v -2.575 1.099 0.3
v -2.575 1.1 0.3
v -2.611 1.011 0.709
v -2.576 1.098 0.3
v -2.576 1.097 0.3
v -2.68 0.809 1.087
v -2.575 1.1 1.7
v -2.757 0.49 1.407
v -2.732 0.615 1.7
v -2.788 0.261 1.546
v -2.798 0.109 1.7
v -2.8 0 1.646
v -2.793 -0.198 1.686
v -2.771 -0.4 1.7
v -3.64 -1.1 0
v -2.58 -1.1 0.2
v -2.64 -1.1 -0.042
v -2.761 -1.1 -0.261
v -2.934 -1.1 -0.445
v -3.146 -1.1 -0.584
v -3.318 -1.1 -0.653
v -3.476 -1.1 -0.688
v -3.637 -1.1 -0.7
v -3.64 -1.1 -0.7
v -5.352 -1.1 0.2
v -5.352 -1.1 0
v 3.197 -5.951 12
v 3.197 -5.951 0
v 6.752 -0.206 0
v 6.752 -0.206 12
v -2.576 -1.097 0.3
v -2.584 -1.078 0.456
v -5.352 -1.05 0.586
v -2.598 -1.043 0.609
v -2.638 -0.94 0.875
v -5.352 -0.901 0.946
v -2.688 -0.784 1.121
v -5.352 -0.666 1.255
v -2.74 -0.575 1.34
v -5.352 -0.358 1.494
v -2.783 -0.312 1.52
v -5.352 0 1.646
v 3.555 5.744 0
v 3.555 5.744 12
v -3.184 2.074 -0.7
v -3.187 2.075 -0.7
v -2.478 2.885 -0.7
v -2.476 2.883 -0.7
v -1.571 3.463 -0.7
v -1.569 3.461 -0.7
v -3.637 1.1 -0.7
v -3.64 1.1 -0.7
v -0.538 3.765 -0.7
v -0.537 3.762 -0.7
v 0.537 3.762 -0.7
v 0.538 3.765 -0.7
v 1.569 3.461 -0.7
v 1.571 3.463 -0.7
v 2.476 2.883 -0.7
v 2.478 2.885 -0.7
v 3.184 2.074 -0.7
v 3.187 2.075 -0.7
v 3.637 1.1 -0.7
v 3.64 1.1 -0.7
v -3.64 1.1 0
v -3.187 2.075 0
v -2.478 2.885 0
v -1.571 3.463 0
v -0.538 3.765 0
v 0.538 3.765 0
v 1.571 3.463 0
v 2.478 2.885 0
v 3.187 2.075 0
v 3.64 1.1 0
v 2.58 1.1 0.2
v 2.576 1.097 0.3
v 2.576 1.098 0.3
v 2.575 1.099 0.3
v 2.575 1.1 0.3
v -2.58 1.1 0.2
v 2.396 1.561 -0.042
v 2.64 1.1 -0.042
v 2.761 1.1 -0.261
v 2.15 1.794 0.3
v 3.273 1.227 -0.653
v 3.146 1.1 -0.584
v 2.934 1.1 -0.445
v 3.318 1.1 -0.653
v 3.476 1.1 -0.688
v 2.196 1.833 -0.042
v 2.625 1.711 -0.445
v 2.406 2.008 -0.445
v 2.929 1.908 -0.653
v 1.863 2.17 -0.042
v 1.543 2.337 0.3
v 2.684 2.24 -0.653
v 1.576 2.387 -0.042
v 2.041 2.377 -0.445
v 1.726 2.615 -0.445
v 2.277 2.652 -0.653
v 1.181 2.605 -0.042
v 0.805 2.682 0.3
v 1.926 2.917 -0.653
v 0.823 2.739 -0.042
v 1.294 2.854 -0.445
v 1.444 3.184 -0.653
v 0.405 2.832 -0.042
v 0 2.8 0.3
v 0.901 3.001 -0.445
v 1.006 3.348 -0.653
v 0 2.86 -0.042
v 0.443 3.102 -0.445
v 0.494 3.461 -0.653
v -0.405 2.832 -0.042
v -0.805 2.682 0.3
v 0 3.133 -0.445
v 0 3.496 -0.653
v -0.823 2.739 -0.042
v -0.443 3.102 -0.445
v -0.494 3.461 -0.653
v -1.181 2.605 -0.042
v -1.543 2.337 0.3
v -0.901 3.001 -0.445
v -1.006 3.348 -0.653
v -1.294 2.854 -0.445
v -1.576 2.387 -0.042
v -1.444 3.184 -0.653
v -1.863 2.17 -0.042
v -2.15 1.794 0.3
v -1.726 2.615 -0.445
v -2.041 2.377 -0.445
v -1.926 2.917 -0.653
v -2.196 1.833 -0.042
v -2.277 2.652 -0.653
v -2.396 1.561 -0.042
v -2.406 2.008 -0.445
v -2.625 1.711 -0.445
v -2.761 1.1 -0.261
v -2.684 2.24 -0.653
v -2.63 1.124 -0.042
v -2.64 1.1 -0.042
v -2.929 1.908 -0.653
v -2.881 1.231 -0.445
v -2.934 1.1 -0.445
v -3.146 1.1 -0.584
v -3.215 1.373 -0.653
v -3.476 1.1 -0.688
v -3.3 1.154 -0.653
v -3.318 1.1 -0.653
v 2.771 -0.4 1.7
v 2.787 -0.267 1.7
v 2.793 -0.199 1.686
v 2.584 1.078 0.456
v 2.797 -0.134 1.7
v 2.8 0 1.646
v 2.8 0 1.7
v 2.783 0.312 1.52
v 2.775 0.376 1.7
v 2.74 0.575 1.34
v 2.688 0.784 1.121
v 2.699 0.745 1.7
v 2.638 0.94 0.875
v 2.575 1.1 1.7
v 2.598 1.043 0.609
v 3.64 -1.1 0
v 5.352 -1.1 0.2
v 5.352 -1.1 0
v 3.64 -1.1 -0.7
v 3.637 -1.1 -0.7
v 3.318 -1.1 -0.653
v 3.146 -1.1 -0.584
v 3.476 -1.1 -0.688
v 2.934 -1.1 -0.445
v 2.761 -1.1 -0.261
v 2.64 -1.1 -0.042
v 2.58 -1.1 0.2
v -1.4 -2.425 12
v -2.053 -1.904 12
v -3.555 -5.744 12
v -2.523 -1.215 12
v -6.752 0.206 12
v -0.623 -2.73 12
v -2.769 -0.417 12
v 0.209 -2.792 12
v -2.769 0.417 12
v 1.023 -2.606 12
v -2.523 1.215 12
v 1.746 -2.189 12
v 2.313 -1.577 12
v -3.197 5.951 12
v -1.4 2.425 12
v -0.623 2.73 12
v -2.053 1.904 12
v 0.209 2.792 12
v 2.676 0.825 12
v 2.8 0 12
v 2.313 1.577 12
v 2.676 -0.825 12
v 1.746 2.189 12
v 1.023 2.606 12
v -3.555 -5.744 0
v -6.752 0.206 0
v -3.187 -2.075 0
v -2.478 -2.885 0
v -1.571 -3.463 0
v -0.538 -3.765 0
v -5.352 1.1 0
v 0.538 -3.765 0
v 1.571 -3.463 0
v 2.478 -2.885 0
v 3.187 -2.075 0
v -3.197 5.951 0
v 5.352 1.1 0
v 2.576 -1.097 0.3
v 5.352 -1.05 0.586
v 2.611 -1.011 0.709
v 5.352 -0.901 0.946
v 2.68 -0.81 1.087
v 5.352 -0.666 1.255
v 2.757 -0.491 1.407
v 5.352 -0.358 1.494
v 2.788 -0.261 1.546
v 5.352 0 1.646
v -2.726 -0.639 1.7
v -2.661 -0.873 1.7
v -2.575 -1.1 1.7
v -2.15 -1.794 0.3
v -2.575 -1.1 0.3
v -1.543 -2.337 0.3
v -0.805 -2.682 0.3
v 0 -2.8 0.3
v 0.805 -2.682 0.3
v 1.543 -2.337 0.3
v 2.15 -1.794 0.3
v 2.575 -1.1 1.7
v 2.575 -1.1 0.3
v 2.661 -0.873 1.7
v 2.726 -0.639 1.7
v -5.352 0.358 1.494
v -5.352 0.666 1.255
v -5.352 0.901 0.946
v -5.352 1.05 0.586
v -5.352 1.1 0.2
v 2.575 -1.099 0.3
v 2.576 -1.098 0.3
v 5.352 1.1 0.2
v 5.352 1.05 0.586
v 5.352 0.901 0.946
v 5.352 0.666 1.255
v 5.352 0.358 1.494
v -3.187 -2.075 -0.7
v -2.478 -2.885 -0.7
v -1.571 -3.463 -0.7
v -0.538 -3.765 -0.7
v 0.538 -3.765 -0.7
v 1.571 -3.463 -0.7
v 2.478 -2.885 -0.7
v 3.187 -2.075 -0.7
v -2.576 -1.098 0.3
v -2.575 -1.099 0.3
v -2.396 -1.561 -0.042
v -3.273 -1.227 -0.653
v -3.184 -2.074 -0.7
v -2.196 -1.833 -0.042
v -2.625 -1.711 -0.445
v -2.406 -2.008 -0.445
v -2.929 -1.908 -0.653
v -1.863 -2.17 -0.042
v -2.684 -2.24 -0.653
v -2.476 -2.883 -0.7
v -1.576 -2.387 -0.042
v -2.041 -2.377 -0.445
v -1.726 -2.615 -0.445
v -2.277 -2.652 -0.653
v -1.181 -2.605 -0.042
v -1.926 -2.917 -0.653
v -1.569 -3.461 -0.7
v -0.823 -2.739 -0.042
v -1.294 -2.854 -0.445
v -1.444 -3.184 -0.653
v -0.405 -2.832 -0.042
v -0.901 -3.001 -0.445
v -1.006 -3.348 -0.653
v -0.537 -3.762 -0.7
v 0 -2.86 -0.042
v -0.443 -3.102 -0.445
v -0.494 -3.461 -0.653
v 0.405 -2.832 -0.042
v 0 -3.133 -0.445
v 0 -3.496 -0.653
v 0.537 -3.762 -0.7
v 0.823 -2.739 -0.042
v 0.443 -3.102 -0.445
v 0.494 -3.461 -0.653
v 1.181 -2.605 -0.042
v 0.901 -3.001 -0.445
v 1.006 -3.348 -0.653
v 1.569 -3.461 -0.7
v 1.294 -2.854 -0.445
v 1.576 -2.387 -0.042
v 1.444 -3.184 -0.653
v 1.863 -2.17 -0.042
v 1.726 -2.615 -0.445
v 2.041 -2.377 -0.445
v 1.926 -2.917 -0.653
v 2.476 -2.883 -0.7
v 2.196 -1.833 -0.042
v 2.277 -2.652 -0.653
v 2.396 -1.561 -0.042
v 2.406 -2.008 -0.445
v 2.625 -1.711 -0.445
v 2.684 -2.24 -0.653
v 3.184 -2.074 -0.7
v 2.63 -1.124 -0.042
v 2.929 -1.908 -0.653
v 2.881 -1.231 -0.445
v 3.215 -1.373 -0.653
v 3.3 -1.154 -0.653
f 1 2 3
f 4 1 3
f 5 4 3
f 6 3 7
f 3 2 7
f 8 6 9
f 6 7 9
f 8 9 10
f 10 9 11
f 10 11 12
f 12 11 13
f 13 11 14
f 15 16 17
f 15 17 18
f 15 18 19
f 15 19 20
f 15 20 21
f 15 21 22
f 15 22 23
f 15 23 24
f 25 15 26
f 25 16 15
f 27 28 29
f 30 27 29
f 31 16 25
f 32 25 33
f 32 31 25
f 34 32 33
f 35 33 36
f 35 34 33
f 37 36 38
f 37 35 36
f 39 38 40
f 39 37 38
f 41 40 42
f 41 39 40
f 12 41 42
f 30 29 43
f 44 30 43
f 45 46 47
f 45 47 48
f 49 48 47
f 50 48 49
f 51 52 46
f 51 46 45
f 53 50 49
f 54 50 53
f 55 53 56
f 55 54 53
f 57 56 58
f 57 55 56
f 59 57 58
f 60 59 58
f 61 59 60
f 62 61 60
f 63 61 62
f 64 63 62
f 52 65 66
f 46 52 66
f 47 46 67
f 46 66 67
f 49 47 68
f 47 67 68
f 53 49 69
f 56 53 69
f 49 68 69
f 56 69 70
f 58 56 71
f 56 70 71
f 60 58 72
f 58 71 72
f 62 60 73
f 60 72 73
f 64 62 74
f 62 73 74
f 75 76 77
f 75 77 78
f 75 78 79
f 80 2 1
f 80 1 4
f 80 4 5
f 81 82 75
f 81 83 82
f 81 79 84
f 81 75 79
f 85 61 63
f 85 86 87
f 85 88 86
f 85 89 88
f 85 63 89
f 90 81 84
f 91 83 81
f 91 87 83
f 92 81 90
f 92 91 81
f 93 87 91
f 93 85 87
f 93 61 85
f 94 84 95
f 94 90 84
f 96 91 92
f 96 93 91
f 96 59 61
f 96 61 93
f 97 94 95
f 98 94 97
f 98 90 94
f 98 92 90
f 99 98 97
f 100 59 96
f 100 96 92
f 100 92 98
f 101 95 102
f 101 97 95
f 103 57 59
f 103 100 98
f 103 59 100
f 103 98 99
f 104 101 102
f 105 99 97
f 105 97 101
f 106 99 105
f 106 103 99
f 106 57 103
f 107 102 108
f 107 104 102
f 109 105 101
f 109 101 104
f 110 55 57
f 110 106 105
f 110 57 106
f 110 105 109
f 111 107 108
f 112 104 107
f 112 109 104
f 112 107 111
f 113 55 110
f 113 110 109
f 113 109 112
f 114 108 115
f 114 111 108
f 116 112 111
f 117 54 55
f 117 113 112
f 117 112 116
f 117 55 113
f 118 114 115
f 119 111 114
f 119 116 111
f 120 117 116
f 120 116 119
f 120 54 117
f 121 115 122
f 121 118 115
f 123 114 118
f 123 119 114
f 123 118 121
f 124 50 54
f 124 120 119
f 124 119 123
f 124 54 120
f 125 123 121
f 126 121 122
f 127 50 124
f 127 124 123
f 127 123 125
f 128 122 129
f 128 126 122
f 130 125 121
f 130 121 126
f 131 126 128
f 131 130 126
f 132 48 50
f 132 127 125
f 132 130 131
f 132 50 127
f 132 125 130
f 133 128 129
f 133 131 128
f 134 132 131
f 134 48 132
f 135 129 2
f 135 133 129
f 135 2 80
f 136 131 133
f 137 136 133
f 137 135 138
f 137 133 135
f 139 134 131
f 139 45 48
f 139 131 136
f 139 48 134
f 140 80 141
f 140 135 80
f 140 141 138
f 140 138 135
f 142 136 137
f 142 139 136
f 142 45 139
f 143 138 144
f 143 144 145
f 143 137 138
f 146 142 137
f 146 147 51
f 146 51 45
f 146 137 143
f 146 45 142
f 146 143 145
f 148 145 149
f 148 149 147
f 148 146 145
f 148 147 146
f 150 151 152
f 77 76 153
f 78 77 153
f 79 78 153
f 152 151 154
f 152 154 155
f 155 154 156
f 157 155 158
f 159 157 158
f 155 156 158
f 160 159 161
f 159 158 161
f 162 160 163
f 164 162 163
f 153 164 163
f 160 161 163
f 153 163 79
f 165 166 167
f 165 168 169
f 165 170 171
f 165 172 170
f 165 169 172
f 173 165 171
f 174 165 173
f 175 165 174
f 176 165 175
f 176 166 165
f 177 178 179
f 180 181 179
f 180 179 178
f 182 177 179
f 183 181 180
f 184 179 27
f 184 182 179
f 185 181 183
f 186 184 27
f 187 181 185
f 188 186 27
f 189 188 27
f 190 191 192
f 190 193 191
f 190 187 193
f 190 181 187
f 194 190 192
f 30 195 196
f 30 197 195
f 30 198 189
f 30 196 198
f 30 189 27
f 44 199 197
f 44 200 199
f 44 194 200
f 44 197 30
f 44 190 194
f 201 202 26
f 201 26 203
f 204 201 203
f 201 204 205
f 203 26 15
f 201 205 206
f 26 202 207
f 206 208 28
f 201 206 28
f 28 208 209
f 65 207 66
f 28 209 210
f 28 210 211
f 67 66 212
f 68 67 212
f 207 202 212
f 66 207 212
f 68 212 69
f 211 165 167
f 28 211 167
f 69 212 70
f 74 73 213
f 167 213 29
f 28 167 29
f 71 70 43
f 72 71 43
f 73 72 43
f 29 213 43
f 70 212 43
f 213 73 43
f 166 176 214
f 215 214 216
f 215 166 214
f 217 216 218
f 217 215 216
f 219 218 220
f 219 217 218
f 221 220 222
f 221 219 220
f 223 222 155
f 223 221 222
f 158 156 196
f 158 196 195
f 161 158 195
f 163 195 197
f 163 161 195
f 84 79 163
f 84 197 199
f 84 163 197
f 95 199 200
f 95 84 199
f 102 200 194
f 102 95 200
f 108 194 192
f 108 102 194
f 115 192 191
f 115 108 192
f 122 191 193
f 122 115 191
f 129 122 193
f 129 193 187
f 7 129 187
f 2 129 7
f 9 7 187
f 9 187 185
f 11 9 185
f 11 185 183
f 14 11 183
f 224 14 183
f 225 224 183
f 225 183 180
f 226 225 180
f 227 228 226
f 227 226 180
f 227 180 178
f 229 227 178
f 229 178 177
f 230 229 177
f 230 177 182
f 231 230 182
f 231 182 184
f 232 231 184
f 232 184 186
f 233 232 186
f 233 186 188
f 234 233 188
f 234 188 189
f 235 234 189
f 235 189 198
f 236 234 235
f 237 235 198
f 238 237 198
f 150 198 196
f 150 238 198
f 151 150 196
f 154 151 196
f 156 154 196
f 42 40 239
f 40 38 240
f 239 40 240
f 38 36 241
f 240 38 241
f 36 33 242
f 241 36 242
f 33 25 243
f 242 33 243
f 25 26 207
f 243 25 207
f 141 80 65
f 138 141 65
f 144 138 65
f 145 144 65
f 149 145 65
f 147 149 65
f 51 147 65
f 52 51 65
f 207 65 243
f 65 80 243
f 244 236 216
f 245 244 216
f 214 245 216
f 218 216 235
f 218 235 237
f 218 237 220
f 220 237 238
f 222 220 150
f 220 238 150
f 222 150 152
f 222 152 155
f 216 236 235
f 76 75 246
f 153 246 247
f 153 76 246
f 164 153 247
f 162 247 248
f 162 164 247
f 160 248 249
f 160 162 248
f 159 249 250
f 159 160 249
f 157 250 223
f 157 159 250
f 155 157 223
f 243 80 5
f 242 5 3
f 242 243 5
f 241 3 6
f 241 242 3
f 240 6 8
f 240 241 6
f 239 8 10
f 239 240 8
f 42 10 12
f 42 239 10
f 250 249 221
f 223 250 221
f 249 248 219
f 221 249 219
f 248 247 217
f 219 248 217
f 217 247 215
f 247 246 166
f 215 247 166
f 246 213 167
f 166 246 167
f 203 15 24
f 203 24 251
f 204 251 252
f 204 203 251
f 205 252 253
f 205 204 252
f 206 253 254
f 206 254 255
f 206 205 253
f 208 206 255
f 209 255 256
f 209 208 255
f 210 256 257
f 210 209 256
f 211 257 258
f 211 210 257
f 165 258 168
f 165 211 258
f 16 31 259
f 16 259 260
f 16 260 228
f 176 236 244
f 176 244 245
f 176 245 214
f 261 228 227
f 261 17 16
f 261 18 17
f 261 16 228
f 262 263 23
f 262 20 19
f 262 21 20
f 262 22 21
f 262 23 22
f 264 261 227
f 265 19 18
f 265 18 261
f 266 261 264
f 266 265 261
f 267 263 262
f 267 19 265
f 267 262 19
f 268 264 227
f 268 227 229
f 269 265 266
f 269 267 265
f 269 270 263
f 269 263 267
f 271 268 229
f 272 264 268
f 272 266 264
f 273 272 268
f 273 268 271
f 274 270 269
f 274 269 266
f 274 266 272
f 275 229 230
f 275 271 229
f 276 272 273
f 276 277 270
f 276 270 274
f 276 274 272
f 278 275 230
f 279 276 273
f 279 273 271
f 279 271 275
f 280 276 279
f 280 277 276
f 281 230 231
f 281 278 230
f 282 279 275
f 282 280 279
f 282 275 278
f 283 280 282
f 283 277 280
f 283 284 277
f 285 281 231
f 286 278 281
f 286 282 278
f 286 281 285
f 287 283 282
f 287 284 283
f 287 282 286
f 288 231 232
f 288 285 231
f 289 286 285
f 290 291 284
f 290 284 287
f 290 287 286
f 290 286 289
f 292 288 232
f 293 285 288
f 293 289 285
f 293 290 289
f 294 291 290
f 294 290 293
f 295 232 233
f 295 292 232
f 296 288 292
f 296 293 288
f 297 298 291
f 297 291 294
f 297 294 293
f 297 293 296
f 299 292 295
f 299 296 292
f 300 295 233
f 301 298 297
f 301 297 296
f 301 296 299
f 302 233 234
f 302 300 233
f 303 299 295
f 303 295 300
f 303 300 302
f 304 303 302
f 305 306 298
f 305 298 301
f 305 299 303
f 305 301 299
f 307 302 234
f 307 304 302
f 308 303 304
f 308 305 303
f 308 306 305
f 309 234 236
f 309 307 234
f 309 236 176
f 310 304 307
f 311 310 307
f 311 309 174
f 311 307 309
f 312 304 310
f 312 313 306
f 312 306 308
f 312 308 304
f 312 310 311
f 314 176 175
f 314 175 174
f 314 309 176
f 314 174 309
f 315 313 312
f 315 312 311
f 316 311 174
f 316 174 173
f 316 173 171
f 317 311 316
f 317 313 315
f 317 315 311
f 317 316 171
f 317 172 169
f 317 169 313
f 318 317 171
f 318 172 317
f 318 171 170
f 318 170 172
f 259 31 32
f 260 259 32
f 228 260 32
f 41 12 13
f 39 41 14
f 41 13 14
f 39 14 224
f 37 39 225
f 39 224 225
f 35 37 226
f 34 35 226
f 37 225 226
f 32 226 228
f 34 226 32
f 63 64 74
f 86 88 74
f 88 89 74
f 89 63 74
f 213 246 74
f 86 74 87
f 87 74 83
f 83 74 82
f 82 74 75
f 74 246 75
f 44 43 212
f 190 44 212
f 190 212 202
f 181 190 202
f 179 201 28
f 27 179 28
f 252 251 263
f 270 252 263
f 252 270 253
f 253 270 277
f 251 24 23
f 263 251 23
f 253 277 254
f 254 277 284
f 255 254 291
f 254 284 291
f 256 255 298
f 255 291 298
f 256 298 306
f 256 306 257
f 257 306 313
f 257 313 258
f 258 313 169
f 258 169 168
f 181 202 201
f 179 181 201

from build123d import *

# Parameters (mm, degrees)
F0_R         = 3.5
F0_R_2       = 2.8
F1_DEPTH     = 12
F3_DEPTH     = 1.7
F5_DEPTH     = 0.7
F6_T4_DEPTH  = 6.526963201
F6_S5_R      = 2.8
F6_T6_DEPTH  = 5
F6_T10_DEPTH = 6.526963201
F6_S11_R     = 2.8
F6_T12_DEPTH = 5
F6_T16_DEPTH = 6.526963201
F6_S17_R     = 2.8
F6_T18_DEPTH = 5
F6_T22_DEPTH = 6.526963201
F6_S23_R     = 2.8
F6_T24_DEPTH = 5
F7_T2_ANGLE  = 236.1398810925
F7_T4_ANGLE  = 236.1398810925


# Not quite as in the source:
# - a fillet or chamfer that OpenCascade refuses, or shapes differently, is made with other operations: its cross-section is extruded or revolved along the edge and cut away or added
# - a pattern or mirror of a feature is missing from the dataset's text; its kind, count and spacing are read off the source's solid


with BuildPart() as f1:
    # F0 (on Top) → F1 (new body)
    with BuildSketch(Plane.XY):
        Polygon((3.1971086236, -5.9505038819), (6.7518418389, -0.2064746542), (3.5547332152, 5.7440292277), (-3.1971086236, 5.9505038819), (-6.7518418389, 0.2064746542), (-3.5547332152, -5.7440292277), align=None)
        Circle(F0_R, mode=Mode.SUBTRACT)
        Circle(F0_R)
        Circle(F0_R_2, mode=Mode.SUBTRACT)
    extrude(amount=F1_DEPTH)

    # F2 (on face) → F3 (cut)
    with BuildSketch(Plane(origin=(0, 0, 0), x_dir=(1, 0, 0), z_dir=(0, 0, -1))):
        with BuildLine():
            Line((-5.3518418389, -1.1), (-2.5748786379, -1.1))
            ThreePointArc((-2.5748786379, -1.1), (-2.8, 0), (-2.5748786379, 1.1))
            Line((-2.5748786379, 1.1), (-5.3518418389, 1.1))
            Line((-5.3518418389, 1.1), (-5.3518418389, -1.1))
        make_face()
        with BuildLine():
            Line((2.5748786379, -1.1), (5.3518418389, -1.1))
            Line((5.3518418389, -1.1), (5.3518418389, 1.1))
            Line((5.3518418389, 1.1), (2.5748786379, 1.1))
            ThreePointArc((2.5748786379, 1.1), (2.7431423756, 0.5613999527), (2.8, 0))
            ThreePointArc((2.8, 0), (2.7431423756, -0.5613999527), (2.5748786379, -1.1))
        make_face()
    extrude(amount=-F3_DEPTH, mode=Mode.SUBTRACT)

    # F4 (on face) → F5 (join)
    with BuildSketch(Plane(origin=(0, 0, 0), x_dir=(1, 0, 0), z_dir=(0, 0, -1))):
        with BuildLine():
            ThreePointArc((-3.6402666737, -1.1), (0, -3.8028333457), (3.6402666737, -1.1))
            Line((3.6402666737, -1.1), (2.5748786379, -1.1))
            ThreePointArc((2.5748786379, -1.1), (0, -2.8), (-2.5748786379, -1.1))
            Line((-2.5748786379, -1.1), (-3.6402666737, -1.1))
        make_face()
    f5 = extrude(amount=F5_DEPTH)

    # F5_copies: F5 across plane
    add(f5.mirror(Plane(origin=(0, 0, 0), x_dir=(0, 0, -1), z_dir=(0, -1, 0))))

    # F6: fillet of radius 1.5 on 4 edges, made by hand


with BuildPart() as f6_tool2:
    # F6_s3 → F6_t4 (new body)
    with BuildSketch(Plane.YZ.offset(-1.1751213621)):
        with BuildLine():
            ThreePointArc((1.1, 0.2), (0.6606601718, 1.2606601718), (-0.4, 1.7))
            Line((-0.4, 1.7), (1.1, 1.7))
            Line((1.1, 1.7), (1.1, 0.2))
        make_face()
    extrude(amount=F6_T4_DEPTH)

    # F6_s5 → F6_t6 (cut, symmetric)
    with BuildSketch(Plane.XY.offset(1)):
        Circle(F6_S5_R)
    extrude(amount=F6_T6_DEPTH, both=True, mode=Mode.SUBTRACT)


with BuildPart() as f1_1:
    add(f1.part)

    # F6_t1: union F6_tool2
    add(f6_tool2.part)


with BuildPart() as f6_tool8:
    # F6_s9 → F6_t10 (new body)
    with BuildSketch(Plane.YZ.offset(-5.3518418389)):
        with BuildLine():
            ThreePointArc((1.1, 0.2), (0.6606601718, 1.2606601718), (-0.4, 1.7))
            Line((-0.4, 1.7), (1.1, 1.7))
            Line((1.1, 1.7), (1.1, 0.2))
        make_face()
    extrude(amount=F6_T10_DEPTH)

    # F6_s11 → F6_t12 (cut, symmetric)
    with BuildSketch(Plane.XY.offset(1)):
        Circle(F6_S11_R)
    extrude(amount=F6_T12_DEPTH, both=True, mode=Mode.SUBTRACT)


with BuildPart() as f1_2:
    add(f1_1.part)

    # F6_t7: union F6_tool8
    add(f6_tool8.part)


with BuildPart() as f6_tool14:
    # F6_s15 → F6_t16 (new body)
    with BuildSketch(Plane.YZ.offset(5.3518418389)):
        with BuildLine():
            ThreePointArc((-1.1, 0.2), (-0.6606601718, 1.2606601718), (0.4, 1.7))
            Line((0.4, 1.7), (-1.1, 1.7))
            Line((-1.1, 1.7), (-1.1, 0.2))
        make_face()
    extrude(amount=-F6_T16_DEPTH)

    # F6_s17 → F6_t18 (cut, symmetric)
    with BuildSketch(Plane.XY.offset(1)):
        Circle(F6_S17_R)
    extrude(amount=F6_T18_DEPTH, both=True, mode=Mode.SUBTRACT)


with BuildPart() as f1_3:
    add(f1_2.part)

    # F6_t13: union F6_tool14
    add(f6_tool14.part)


with BuildPart() as f6_tool20:
    # F6_s21 → F6_t22 (new body)
    with BuildSketch(Plane.YZ.offset(1.1751213621)):
        with BuildLine():
            ThreePointArc((-1.1, 0.2), (-0.6606601718, 1.2606601718), (0.4, 1.7))
            Line((0.4, 1.7), (-1.1, 1.7))
            Line((-1.1, 1.7), (-1.1, 0.2))
        make_face()
    extrude(amount=-F6_T22_DEPTH)

    # F6_s23 → F6_t24 (cut, symmetric)
    with BuildSketch(Plane.XY.offset(1)):
        Circle(F6_S23_R)
    extrude(amount=F6_T24_DEPTH, both=True, mode=Mode.SUBTRACT)


with BuildPart() as f1_4:
    add(f1_3.part)

    # F6_t19: union F6_tool20
    add(f6_tool20.part)

    # F7: fillet of radius 1 on 2 edges, made by hand

    # F7_s1 → F7_t2 (revolve, cut)
    with BuildSketch(Plane(origin=(0, 0, 0), x_dir=(0, 0, 1), z_dir=(-0.4705490205, -0.8823738546, 0))):
        with BuildLine():
            ThreePointArc((0.3, -2.8), (-0.4071067812, -3.0928932188), (-0.7, -3.8))
            Line((-0.7, -3.8), (-0.7, -2.8))
            Line((-0.7, -2.8), (0.3, -2.8))
        make_face()
    revolve(axis=Axis((0, 0, -0.7), (0, 0, 1)), revolution_arc=F7_T2_ANGLE, mode=Mode.SUBTRACT)

    # F7_s3 → F7_t4 (revolve, cut)
    with BuildSketch(Plane(origin=(0, 0, 0), x_dir=(0, 0, 1), z_dir=(-0.4705490205, 0.8823738546, 0))):
        with BuildLine():
            ThreePointArc((0.3, 2.8), (-0.4071067812, 3.0928932188), (-0.7, 3.8))
            Line((-0.7, 3.8), (-0.7, 2.8))
            Line((-0.7, 2.8), (0.3, 2.8))
        make_face()
    revolve(axis=Axis((0, 0, -0.7), (0, 0, -1)), revolution_arc=F7_T4_ANGLE, mode=Mode.SUBTRACT)


solid = f1_4.part
